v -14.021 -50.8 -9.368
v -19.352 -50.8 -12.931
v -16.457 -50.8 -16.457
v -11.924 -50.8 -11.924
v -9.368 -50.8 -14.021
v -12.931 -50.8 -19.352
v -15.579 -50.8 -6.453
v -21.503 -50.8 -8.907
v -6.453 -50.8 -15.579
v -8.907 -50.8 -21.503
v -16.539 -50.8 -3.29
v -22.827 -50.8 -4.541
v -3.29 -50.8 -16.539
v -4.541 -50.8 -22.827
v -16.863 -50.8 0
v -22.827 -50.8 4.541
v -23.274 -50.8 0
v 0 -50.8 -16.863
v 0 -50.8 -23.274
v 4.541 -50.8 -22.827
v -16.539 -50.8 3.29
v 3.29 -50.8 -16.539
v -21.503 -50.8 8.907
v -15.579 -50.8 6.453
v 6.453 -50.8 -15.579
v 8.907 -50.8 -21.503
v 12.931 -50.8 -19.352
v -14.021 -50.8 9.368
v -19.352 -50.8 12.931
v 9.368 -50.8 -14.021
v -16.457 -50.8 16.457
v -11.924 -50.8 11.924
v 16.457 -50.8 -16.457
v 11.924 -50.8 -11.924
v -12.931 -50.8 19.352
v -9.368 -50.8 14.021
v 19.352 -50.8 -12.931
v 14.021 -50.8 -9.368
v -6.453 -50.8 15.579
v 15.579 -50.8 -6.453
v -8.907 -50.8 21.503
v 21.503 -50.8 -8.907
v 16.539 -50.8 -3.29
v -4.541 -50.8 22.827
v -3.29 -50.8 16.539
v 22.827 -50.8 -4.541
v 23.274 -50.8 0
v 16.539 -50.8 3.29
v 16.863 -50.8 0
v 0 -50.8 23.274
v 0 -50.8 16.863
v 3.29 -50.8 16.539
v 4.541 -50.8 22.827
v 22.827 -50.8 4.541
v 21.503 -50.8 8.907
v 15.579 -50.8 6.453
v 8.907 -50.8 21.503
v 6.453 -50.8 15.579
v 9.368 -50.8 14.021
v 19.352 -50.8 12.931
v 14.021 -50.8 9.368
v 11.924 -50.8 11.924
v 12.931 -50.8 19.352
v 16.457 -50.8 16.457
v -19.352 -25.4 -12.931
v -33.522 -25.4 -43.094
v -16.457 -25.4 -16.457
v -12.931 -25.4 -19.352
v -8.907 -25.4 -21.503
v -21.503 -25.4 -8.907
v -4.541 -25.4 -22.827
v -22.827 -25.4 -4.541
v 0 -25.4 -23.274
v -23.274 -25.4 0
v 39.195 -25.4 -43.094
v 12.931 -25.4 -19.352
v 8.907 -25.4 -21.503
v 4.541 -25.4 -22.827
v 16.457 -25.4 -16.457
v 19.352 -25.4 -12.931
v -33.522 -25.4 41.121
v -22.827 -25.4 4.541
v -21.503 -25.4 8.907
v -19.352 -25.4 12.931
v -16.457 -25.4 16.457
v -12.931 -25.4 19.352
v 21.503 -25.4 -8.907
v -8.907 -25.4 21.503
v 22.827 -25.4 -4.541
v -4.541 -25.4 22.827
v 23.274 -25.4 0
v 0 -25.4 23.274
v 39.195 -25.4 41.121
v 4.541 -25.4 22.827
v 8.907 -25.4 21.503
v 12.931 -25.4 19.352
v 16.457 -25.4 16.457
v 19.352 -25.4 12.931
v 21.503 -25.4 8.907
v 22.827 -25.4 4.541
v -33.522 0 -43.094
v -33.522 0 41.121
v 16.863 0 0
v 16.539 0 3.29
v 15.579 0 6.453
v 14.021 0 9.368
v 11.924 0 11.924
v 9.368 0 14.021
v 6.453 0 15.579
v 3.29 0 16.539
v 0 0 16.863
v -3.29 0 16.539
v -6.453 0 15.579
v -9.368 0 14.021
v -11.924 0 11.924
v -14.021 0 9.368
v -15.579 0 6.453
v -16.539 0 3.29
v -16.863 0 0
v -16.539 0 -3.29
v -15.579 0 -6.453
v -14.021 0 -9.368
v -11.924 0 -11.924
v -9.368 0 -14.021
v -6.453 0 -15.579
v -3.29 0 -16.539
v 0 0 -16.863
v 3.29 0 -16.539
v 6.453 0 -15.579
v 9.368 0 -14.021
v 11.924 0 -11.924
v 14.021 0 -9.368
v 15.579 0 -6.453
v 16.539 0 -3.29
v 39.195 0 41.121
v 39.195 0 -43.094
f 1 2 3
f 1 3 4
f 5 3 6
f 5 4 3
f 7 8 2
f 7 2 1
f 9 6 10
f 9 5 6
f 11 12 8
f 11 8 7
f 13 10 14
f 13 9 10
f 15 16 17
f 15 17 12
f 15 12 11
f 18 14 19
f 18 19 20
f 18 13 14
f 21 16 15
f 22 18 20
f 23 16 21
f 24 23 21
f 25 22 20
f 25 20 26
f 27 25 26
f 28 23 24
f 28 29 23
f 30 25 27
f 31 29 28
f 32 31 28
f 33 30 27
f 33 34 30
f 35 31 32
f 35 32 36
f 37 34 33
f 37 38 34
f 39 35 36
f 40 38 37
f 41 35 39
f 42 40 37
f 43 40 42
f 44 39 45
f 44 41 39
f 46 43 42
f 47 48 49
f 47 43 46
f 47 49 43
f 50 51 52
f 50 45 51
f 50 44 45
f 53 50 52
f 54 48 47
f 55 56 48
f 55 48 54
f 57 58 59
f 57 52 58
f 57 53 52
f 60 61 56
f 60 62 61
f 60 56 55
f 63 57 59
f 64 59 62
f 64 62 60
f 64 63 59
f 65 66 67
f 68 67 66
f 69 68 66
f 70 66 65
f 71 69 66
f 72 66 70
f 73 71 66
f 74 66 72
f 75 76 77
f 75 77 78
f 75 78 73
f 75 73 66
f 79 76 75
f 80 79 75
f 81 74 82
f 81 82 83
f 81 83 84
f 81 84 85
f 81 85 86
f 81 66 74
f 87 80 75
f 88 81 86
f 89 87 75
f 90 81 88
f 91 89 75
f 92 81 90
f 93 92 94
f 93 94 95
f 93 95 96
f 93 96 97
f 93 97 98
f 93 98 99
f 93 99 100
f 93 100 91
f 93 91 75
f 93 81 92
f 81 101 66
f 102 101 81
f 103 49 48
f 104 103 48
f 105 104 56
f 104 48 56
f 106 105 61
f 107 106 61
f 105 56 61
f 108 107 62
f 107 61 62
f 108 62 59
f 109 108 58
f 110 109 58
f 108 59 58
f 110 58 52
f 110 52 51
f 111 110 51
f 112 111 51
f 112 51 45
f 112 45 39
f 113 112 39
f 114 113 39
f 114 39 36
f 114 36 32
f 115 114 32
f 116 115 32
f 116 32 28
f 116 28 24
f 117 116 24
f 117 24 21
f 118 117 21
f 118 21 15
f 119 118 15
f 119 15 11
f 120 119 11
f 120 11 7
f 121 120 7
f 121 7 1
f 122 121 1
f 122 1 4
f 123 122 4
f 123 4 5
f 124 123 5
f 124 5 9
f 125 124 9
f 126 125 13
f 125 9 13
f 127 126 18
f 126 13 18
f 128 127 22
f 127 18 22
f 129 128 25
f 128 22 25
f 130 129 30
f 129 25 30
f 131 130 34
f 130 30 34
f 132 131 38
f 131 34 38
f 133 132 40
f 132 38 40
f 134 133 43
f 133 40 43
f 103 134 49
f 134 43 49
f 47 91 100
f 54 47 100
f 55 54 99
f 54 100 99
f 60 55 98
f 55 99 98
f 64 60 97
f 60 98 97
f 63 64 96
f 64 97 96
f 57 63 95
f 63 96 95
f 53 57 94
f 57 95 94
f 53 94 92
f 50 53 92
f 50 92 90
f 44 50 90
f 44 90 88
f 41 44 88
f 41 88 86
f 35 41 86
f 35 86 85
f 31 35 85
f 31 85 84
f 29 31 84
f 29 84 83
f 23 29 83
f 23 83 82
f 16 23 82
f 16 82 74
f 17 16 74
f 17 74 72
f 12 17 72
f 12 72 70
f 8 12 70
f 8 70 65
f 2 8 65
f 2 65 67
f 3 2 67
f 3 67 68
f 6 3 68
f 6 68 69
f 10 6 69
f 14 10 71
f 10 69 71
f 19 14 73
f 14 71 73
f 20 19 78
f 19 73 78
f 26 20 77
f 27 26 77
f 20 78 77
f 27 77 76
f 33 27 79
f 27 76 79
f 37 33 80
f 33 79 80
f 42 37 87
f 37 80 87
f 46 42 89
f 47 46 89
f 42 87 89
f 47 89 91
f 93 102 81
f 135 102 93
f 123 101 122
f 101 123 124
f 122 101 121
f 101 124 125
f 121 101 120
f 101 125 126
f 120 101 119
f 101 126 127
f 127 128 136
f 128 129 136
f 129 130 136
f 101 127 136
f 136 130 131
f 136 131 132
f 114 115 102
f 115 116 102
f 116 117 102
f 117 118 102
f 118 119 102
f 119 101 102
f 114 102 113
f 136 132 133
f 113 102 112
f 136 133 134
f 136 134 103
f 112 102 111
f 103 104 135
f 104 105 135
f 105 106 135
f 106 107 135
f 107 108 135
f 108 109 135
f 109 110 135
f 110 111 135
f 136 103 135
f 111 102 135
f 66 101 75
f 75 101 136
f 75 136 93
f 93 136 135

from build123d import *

# Parameters (mm, degrees)
F0_W     = 72.716318
F0_H     = 84.215194
F1_DEPTH = 25.4
F2_R     = 23.274409
F3_DEPTH = 50.8
F4_R     = 16.862777
F5_DEPTH = 50.801


with BuildPart() as f1:
    # F0 (on Front) → F1 (new body)
    with BuildSketch(Plane.XZ):
        with Locations((2.836455, -0.9862)):
            Rectangle(F0_W, F0_H)
    extrude(amount=F1_DEPTH)

    # F2 (on Front) → F3 (join)
    with BuildSketch(Plane.XZ):
        Circle(F2_R)
    extrude(amount=F3_DEPTH)

    # F4 (on face) → F5 (cut, through all)
    with BuildSketch(Plane.XZ.offset(50.8)):
        Circle(F4_R)
    extrude(amount=-F5_DEPTH, mode=Mode.SUBTRACT)


solid = f1.part
